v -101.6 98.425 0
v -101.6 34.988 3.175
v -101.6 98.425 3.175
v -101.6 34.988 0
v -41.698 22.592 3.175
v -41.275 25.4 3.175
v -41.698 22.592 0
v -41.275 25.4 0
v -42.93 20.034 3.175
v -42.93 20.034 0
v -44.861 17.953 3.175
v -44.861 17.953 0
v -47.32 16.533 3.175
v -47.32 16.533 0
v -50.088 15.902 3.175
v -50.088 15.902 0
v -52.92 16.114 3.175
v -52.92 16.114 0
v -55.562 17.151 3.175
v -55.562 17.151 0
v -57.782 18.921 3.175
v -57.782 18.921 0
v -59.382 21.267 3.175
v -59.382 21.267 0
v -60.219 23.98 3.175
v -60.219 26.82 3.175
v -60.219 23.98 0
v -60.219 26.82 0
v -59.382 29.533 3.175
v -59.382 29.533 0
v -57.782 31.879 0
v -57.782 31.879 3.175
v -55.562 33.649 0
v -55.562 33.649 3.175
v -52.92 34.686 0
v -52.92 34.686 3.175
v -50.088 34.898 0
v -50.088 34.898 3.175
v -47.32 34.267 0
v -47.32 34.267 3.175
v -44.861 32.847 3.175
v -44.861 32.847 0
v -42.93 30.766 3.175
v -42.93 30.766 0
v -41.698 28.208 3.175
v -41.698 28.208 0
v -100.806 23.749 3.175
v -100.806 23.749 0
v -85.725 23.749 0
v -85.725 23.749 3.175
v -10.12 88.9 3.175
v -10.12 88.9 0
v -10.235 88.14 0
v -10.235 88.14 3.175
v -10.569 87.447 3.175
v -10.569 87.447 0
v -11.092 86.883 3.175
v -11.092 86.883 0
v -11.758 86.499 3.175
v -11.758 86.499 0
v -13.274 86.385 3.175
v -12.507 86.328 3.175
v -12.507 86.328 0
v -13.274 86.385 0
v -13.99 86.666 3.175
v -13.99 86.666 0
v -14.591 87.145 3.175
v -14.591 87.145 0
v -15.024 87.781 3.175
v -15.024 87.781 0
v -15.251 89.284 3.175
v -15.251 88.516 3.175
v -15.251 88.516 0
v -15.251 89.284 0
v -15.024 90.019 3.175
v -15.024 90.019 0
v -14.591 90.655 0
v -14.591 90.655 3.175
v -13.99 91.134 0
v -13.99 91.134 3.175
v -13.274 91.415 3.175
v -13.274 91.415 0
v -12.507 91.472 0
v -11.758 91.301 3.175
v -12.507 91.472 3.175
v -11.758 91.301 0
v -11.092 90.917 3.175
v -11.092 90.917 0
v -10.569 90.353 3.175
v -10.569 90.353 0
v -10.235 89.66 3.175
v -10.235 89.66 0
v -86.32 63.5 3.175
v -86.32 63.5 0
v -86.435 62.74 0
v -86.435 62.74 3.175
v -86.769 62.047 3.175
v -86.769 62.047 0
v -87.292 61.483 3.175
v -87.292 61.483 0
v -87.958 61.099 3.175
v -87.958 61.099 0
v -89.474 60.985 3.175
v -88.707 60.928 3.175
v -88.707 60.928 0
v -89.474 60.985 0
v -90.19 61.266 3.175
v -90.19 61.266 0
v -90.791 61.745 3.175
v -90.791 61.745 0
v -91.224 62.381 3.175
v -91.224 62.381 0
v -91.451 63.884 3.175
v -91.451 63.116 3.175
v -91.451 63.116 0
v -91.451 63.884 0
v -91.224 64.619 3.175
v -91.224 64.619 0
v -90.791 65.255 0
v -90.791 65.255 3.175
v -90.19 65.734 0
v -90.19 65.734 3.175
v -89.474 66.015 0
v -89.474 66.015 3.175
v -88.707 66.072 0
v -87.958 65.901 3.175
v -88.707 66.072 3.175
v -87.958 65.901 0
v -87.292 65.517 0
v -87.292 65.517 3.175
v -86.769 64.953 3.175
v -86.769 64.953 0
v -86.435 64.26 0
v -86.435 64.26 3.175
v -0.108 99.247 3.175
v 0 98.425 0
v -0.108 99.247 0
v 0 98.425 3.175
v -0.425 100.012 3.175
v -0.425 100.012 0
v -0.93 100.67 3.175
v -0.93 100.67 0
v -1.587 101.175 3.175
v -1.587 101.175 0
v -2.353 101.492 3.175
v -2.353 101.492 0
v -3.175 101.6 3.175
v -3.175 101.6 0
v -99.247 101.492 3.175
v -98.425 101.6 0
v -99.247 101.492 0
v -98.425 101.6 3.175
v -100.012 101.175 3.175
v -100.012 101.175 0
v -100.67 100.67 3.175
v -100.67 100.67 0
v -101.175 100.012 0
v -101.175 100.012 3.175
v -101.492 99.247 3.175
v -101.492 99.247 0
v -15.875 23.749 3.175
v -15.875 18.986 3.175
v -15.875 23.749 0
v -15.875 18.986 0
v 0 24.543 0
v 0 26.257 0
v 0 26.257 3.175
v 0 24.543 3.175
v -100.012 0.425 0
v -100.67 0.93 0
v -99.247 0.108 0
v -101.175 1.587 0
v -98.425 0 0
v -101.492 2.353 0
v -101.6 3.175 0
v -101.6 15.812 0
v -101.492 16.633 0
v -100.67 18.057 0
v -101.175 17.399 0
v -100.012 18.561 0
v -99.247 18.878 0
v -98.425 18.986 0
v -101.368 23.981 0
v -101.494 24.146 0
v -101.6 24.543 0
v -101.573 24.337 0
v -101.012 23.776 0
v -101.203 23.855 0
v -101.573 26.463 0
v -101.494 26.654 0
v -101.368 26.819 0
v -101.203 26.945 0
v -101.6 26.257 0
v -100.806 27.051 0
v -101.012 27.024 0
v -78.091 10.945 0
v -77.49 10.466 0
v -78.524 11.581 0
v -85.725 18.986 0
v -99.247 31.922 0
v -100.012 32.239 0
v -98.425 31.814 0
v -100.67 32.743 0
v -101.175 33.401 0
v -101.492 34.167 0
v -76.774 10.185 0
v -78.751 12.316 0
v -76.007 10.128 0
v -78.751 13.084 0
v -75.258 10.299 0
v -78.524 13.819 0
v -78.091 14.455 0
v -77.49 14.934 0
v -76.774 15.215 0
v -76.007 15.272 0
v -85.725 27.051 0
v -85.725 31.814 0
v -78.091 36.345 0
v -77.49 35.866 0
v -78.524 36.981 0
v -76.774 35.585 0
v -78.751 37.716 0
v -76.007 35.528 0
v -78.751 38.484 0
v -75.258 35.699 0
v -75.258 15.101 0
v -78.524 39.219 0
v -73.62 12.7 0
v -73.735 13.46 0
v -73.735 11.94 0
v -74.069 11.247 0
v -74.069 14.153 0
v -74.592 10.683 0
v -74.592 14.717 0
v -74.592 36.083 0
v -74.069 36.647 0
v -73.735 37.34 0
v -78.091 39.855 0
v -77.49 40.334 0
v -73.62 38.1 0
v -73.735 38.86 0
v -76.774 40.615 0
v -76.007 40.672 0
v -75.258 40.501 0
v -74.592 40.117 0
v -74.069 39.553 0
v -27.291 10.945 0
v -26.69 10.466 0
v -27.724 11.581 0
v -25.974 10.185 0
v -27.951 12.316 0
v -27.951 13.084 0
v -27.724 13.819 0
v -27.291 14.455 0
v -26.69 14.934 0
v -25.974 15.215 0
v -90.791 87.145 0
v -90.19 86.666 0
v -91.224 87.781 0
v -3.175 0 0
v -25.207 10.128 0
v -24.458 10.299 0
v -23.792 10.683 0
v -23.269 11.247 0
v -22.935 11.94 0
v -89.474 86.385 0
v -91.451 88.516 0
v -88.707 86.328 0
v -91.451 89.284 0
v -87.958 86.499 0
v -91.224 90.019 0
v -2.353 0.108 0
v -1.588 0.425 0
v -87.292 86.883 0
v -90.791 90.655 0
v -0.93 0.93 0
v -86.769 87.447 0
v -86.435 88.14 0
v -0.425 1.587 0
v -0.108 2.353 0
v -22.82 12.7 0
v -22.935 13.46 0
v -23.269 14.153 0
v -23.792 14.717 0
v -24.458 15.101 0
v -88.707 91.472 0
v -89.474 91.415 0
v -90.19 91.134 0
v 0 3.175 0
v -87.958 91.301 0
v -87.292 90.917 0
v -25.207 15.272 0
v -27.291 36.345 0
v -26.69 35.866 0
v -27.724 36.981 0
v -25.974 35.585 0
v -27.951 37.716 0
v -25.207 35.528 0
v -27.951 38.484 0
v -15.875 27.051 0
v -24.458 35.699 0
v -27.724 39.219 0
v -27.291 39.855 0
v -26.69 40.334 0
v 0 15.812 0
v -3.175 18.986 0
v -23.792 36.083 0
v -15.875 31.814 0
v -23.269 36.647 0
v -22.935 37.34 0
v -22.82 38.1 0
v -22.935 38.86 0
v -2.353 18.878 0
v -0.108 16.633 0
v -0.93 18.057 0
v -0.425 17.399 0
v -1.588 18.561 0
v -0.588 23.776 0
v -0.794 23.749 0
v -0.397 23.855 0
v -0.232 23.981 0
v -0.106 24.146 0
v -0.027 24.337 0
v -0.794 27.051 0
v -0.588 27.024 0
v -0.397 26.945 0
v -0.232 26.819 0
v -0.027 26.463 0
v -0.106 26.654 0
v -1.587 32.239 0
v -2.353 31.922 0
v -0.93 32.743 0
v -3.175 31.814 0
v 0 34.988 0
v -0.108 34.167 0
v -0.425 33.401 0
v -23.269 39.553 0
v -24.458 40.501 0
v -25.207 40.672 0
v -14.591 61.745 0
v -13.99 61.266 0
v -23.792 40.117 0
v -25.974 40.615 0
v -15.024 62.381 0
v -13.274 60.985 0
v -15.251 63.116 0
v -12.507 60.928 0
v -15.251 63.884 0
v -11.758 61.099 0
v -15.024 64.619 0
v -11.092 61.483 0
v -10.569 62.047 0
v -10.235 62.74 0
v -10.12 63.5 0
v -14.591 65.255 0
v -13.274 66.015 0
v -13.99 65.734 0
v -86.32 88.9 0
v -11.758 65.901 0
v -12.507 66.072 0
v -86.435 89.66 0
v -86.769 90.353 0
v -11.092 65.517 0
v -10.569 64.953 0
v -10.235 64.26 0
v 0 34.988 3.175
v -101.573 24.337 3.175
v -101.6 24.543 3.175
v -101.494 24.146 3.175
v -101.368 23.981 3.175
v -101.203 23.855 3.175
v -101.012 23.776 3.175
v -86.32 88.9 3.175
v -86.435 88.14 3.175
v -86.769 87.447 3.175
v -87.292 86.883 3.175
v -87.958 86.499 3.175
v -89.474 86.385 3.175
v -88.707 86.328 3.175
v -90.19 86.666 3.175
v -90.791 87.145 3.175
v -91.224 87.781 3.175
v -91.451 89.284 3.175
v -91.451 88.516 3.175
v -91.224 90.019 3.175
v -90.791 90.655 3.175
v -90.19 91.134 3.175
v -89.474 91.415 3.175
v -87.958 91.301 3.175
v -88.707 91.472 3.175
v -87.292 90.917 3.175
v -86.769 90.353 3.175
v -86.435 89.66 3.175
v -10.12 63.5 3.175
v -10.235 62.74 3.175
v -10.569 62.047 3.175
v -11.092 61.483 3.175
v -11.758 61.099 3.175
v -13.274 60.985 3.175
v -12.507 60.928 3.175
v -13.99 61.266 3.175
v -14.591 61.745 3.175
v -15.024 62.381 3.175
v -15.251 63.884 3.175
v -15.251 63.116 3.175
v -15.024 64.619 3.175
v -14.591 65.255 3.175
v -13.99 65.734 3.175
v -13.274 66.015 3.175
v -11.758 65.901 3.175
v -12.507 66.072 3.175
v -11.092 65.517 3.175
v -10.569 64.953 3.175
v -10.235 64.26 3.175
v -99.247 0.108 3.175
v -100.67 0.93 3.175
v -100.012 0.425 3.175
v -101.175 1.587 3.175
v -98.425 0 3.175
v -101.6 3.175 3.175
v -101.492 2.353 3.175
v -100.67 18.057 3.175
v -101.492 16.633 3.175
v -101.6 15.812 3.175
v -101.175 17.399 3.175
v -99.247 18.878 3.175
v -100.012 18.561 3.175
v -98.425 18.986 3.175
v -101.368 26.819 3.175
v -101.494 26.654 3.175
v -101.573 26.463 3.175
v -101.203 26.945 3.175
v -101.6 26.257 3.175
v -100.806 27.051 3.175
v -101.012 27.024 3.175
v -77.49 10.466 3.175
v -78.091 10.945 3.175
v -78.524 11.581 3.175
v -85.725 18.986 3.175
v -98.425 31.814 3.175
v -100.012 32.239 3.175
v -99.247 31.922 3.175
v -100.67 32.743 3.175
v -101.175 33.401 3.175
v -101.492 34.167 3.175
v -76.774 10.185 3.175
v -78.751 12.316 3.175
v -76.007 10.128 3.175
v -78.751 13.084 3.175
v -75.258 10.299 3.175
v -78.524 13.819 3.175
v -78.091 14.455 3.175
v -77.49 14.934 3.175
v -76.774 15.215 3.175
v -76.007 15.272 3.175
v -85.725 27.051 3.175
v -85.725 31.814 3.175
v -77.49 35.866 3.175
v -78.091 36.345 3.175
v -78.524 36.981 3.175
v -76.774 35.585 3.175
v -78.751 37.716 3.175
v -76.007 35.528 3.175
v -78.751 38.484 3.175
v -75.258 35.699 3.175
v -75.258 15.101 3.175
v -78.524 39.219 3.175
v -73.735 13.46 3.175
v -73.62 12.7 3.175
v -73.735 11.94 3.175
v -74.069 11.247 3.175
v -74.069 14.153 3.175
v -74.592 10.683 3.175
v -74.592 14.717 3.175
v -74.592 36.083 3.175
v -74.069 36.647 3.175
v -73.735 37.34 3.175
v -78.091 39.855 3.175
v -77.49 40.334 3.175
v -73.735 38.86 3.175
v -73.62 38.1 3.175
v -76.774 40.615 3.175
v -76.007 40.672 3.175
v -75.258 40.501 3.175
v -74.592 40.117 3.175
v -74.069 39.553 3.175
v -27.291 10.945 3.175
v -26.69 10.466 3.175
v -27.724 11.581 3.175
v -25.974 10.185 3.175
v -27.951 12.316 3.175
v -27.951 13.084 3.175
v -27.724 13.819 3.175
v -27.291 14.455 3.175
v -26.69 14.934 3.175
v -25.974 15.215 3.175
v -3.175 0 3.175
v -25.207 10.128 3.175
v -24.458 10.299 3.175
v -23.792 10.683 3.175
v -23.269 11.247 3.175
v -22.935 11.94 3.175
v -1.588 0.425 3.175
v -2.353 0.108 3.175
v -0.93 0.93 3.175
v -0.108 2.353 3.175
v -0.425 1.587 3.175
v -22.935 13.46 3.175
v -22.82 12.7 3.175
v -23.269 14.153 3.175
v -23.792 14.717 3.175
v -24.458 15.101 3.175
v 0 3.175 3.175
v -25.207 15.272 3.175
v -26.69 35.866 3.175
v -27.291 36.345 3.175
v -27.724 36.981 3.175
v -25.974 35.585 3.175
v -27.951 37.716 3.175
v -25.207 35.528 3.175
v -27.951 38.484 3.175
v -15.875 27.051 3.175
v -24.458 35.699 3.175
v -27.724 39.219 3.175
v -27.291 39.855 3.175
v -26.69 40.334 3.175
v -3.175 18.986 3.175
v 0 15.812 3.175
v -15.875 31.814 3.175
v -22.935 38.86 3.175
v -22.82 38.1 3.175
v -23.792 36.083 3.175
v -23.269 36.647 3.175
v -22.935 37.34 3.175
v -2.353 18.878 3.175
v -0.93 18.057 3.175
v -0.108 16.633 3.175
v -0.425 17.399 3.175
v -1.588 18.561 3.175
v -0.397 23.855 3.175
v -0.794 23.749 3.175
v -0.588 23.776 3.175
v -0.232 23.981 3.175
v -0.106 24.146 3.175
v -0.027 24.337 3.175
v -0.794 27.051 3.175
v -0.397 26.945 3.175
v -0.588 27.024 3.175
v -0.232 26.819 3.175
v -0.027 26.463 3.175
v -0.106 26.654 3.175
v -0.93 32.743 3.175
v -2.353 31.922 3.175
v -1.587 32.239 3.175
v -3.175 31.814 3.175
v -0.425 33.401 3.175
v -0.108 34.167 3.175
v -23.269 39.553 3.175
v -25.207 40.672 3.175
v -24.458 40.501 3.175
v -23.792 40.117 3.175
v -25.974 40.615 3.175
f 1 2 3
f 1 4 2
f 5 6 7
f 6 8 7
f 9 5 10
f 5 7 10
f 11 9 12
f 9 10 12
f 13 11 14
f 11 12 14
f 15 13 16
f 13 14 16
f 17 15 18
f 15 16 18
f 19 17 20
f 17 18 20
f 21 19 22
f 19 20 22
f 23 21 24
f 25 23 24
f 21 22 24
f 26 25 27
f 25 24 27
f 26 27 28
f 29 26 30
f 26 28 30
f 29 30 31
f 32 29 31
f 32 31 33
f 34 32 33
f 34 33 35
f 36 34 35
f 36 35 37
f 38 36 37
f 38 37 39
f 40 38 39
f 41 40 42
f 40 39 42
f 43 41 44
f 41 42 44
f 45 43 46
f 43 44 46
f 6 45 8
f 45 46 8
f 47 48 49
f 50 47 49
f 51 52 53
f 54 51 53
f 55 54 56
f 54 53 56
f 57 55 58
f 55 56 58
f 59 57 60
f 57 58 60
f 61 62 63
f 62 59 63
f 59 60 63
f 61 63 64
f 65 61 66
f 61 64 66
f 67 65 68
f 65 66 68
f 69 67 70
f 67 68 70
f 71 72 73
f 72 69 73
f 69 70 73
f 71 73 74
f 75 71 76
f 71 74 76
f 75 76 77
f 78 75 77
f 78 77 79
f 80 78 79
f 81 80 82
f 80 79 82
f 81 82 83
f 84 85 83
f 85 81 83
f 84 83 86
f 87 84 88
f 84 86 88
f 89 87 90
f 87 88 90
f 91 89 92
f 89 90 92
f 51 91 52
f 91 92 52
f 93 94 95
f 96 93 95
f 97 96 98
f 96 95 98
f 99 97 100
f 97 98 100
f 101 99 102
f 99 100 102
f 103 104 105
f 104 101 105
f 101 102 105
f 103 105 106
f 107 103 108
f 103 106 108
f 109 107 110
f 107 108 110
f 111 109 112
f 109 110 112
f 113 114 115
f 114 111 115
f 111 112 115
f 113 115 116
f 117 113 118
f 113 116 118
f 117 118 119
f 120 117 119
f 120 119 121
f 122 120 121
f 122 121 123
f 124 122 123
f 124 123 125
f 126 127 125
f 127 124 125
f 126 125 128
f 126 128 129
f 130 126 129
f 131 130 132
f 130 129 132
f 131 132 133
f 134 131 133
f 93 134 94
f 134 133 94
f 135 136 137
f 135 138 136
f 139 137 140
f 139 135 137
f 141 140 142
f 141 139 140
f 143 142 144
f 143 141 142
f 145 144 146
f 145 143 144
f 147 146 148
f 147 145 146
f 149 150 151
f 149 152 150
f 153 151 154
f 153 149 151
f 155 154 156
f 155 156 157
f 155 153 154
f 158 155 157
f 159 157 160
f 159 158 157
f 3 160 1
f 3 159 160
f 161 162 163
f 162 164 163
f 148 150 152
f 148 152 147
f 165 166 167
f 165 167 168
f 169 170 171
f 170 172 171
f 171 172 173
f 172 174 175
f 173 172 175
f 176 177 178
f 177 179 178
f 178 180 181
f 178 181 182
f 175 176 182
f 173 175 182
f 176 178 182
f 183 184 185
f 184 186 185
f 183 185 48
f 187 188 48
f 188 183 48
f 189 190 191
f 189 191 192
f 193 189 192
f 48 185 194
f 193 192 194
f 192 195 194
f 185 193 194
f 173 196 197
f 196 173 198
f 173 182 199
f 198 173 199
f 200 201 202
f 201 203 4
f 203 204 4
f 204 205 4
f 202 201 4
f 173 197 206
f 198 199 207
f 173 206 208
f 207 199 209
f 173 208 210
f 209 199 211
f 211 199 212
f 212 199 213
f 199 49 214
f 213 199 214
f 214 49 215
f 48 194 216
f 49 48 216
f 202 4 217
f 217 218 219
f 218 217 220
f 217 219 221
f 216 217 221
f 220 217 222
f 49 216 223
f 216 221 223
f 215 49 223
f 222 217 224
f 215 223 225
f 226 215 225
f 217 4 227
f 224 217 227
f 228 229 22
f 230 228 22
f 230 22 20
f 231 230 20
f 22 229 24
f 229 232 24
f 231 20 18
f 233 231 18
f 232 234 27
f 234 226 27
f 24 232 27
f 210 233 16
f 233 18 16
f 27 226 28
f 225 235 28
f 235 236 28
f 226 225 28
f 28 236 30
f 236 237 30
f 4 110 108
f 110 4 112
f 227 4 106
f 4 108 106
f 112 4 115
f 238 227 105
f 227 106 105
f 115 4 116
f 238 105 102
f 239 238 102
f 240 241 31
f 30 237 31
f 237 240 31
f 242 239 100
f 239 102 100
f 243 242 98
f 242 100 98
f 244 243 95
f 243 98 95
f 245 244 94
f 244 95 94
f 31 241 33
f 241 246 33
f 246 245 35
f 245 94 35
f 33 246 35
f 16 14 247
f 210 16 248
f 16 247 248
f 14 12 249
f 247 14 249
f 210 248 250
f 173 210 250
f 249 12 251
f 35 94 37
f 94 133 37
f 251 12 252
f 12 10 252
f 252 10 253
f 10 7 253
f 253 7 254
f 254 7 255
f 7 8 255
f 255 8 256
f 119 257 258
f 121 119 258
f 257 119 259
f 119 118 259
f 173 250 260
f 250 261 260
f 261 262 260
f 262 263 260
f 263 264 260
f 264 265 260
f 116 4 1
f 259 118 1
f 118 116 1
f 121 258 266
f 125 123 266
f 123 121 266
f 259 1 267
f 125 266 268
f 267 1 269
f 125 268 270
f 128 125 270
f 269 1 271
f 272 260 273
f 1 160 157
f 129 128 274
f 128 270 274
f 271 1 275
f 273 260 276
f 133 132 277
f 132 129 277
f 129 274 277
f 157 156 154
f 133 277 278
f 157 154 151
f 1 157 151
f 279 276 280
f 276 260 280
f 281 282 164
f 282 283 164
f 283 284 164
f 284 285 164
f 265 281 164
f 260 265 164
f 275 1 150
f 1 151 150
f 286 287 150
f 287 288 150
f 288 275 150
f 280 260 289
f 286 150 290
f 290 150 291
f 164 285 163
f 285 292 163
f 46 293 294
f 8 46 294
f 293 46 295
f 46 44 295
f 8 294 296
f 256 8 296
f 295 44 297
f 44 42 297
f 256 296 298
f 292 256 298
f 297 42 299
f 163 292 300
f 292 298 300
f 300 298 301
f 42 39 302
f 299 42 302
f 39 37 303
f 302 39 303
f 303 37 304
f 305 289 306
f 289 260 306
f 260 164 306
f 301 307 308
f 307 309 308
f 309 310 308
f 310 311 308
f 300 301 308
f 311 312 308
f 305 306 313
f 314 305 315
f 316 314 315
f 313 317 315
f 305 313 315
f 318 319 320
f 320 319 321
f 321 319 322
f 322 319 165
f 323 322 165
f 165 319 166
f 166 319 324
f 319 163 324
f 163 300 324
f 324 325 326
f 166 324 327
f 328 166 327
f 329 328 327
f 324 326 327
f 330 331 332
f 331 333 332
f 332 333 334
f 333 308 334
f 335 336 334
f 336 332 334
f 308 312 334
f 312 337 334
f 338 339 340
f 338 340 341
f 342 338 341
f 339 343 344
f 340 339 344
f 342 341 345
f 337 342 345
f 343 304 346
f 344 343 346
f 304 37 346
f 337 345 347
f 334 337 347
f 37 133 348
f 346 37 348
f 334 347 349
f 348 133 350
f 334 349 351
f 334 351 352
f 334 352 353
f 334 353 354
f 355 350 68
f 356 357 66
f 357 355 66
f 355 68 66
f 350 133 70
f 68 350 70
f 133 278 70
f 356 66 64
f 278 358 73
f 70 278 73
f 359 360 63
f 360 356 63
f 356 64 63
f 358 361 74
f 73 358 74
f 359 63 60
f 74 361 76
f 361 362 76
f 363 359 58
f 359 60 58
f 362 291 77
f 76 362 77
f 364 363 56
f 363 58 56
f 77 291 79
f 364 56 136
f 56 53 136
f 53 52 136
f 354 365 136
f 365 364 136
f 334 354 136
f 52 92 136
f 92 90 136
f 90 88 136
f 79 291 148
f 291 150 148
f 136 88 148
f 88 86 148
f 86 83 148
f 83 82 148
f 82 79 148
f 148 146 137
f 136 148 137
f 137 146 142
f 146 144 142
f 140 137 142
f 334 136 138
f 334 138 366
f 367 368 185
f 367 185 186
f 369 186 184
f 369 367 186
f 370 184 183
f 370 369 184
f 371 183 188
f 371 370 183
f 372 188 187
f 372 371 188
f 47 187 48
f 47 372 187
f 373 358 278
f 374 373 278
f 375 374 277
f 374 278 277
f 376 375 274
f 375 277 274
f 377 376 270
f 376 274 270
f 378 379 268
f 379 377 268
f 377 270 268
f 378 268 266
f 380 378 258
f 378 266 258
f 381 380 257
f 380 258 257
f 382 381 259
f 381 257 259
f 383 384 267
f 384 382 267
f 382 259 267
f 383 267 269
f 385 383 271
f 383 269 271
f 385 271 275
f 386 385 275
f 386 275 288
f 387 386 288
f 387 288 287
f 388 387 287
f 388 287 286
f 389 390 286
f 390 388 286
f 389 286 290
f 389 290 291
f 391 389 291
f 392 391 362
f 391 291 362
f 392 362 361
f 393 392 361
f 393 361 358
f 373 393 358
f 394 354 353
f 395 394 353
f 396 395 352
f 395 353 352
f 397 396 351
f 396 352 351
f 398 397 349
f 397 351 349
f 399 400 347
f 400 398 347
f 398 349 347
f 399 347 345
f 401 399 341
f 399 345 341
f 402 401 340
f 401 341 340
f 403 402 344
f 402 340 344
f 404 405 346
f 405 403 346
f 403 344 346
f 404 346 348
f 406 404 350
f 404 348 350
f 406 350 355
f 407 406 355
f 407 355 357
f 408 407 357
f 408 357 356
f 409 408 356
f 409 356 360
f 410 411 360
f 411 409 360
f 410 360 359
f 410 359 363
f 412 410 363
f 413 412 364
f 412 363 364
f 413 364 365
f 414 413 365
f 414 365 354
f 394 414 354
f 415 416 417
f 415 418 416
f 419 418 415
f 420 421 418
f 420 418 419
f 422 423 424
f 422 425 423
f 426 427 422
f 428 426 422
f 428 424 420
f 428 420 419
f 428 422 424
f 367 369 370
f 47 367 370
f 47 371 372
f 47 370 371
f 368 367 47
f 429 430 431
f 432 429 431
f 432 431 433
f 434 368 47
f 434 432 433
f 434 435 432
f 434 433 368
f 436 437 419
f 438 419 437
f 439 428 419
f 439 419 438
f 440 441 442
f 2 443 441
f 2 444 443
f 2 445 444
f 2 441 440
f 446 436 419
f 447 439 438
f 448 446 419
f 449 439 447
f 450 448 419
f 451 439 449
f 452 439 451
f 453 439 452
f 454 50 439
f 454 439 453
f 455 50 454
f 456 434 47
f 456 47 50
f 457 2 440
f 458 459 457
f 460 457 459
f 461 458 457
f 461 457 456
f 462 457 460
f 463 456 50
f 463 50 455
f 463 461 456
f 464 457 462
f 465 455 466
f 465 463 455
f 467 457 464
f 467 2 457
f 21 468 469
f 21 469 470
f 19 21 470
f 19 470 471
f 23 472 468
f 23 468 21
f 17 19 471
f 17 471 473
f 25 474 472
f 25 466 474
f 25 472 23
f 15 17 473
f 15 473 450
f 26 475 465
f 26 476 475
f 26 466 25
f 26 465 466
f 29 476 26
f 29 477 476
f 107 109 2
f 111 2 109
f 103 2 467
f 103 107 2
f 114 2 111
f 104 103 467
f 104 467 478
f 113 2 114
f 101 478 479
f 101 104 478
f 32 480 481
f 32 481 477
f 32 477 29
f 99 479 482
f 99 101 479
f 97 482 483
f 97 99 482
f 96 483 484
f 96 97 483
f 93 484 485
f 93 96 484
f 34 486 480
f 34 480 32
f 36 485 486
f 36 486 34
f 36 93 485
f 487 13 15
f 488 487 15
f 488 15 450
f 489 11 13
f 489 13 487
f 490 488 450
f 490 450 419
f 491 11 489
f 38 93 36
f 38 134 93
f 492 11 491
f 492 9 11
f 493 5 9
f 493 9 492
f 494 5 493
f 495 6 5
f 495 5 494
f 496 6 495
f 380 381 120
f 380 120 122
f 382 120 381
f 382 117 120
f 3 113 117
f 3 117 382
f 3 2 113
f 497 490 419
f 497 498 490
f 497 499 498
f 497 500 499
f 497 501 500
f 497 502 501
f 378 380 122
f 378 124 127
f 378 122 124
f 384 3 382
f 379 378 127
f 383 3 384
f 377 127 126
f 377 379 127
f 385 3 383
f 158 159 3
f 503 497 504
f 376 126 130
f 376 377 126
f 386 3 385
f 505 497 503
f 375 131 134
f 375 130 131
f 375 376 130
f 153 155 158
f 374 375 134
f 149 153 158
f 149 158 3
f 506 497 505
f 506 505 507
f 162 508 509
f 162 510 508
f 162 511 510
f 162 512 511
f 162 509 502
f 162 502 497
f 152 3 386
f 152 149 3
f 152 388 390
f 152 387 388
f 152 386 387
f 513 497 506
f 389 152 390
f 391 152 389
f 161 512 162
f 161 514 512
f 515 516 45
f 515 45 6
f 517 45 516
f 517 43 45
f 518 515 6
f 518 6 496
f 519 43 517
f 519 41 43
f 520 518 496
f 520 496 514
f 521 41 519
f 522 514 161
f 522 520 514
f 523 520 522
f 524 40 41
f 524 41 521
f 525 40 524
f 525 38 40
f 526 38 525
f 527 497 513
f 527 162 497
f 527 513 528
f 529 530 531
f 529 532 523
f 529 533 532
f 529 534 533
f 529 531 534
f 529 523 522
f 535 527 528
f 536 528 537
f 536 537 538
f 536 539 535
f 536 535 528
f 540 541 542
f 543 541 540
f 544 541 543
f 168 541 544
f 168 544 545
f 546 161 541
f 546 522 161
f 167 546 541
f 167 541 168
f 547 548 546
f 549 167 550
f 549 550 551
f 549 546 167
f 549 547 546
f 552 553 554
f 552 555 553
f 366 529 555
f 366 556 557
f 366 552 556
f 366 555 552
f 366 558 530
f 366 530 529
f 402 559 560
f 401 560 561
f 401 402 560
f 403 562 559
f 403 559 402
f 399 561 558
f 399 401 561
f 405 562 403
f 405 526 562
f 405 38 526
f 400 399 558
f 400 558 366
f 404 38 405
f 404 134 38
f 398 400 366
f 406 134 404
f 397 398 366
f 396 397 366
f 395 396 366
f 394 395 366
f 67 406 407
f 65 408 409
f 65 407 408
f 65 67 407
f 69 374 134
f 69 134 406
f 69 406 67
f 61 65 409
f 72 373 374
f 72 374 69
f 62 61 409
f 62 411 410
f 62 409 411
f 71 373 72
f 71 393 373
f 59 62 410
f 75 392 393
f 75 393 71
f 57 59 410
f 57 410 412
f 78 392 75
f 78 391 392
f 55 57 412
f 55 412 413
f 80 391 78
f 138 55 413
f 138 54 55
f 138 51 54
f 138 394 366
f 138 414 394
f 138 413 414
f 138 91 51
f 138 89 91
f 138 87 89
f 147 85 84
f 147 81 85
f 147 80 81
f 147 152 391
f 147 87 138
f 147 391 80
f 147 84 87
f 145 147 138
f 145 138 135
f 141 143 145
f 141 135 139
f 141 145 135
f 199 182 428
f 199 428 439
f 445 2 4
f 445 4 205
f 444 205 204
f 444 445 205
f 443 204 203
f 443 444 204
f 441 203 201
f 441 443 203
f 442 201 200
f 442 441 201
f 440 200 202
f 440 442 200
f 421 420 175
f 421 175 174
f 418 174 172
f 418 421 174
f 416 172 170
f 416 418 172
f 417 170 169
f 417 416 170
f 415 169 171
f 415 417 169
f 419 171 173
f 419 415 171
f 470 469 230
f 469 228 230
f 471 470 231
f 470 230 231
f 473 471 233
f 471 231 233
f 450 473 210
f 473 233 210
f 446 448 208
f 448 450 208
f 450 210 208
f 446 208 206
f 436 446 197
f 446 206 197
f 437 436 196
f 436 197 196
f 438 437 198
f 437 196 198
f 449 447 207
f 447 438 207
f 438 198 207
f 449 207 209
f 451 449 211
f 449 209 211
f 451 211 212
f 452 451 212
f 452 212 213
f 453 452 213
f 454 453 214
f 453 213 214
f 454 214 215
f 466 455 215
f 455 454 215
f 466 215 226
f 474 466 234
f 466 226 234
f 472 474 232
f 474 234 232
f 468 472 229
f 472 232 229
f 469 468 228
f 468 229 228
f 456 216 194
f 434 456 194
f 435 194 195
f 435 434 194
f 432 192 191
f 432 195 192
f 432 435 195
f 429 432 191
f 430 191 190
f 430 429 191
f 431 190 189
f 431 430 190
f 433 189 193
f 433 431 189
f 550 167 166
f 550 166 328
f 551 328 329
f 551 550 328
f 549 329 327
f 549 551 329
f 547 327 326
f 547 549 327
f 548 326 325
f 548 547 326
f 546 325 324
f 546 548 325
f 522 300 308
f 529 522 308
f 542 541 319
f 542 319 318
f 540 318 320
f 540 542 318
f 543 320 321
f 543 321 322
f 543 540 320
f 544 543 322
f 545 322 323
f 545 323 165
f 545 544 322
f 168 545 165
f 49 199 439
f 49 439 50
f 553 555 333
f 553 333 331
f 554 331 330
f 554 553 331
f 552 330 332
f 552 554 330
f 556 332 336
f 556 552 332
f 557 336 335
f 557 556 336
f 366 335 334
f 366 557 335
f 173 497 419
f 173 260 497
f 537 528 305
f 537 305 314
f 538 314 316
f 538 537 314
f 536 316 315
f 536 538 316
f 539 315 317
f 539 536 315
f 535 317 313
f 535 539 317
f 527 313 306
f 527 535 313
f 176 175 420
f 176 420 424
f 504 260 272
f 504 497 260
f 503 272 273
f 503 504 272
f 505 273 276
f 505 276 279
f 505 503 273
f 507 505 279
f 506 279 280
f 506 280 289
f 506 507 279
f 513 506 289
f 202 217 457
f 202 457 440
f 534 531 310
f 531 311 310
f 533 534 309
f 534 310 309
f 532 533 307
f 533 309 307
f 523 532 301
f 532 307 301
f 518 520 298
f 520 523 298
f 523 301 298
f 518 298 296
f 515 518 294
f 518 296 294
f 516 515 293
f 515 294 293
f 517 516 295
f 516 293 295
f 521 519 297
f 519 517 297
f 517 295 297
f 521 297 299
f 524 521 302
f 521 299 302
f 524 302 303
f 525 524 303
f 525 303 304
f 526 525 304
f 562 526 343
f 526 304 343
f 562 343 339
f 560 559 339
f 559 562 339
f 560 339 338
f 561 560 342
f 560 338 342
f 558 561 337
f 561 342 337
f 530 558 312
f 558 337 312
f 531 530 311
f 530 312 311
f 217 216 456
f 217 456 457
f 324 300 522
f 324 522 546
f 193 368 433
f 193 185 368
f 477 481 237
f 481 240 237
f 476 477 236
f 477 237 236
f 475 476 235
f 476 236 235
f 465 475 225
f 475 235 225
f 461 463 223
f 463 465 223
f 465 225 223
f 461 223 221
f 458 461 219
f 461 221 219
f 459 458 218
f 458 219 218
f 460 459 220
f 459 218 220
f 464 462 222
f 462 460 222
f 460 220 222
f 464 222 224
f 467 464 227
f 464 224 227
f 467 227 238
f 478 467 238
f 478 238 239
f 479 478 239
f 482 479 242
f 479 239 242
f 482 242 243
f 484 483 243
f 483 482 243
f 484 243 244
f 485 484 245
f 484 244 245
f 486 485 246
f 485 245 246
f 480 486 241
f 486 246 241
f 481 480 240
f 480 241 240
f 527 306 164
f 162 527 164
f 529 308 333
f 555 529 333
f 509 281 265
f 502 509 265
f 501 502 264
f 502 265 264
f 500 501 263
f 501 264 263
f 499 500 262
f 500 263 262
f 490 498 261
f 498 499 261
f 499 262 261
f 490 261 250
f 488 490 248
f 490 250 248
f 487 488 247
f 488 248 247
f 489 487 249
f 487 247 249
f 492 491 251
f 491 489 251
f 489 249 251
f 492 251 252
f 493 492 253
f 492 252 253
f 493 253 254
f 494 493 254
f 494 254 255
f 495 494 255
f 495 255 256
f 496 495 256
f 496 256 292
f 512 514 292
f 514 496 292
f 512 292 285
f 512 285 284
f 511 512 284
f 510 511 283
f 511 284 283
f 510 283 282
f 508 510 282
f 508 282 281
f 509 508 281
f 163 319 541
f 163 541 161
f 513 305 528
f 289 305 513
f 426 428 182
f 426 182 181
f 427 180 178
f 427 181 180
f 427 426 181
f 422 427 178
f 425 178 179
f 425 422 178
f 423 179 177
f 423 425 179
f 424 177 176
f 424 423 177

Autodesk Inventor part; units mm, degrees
ref_plane "YZ Plane" through (0, 0, 0) normal (1, 0, 0) x (0, 1, 0)
ref_plane "XZ Plane" through (0, 0, 0) normal (0, 1, 0) x (-1, 0, 0)
ref_plane "XY Plane" through (0, 0, 0) normal (0, 0, 1) x (1, 0, 0)
sketch "Sketch2" plane through (0, 0, 0) normal (0, 0, 1) x (1, 0, 0)
  line L0 (0, 0) -> (-101.6, 0)
  line L1 (-101.6, 0) -> (-101.6, 101.6)
  line L2 (-101.6, 101.6) -> (0, 101.6)
  line L3 (0, 101.6) -> (0, 0)
  circle A0 centre (-12.7, 88.9) radius 2.5797
  circle A1 centre (-50.8, 76.2) radius 9.525
  circle A2 centre (-25.4, 38.1) radius 2.5797
  circle A3 centre (-50.8, 25.4) radius 9.525
  circle A4 centre (-88.9, 88.9) radius 2.5797
  circle A5 centre (-12.7, 63.5) radius 2.5797
  circle A6 centre (-88.9, 63.5) radius 2.5797
  circle A7 centre (-76.2, 38.1) radius 2.5797
  circle A8 centre (-25.4, 12.7) radius 2.5797
  circle A9 centre (-76.2, 12.7) radius 2.5797
  line L4 (-85.725, 19.05) -> (-101.6, 19.05)
  line L5 (-101.6, 19.05) -> (-101.6, 22.225)
  line L6 (-101.6, 22.225) -> (-85.725, 22.225)
  line L7 (-85.725, 22.225) -> (-85.725, 19.05)
  line L8 (-101.6, 22.225) -> (-85.725, 22.225)
  line L9 (-85.725, 22.225) -> (-85.725, 23.8125)
  line L10 (-85.725, 23.8125) -> (-101.6, 23.8125)
  line L11 (-101.6, 23.8125) -> (-101.6, 22.225)
  line L12 (-85.725, 23.8125) -> (-101.6, 23.8125)
  line L13 (-101.6, 23.8125) -> (-101.6, 26.9875)
  line L14 (-101.6, 26.9875) -> (-85.725, 26.9875)
  line L15 (-85.725, 26.9875) -> (-85.725, 23.8125)
  line L16 (-101.6, 26.9875) -> (-85.725, 26.9875)
  line L17 (-85.725, 26.9875) -> (-85.725, 28.575)
  line L18 (-85.725, 28.575) -> (-101.6, 28.575)
  line L19 (-101.6, 28.575) -> (-101.6, 26.9875)
  line L20 (-85.725, 28.575) -> (-101.6, 28.575)
  line L21 (-101.6, 28.575) -> (-101.6, 31.75)
  line L22 (-101.6, 31.75) -> (-85.725, 31.75)
  line L23 (-85.725, 31.75) -> (-85.725, 28.575)
  line L24 (-85.725, 31.8135) -> (-101.6, 31.8135)
  line L25 (-101.6, 31.8135) -> (-101.6, 28.5115)
  line L26 (-101.6, 28.5115) -> (-85.725, 28.5115)
  line L27 (-85.725, 28.5115) -> (-85.725, 31.8135)
  line L28 (-85.725, 27.051) -> (-101.6, 27.051)
  line L29 (-101.6, 27.051) -> (-101.6, 23.749)
  line L30 (-101.6, 23.749) -> (-85.725, 23.749)
  line L31 (-85.725, 23.749) -> (-85.725, 27.051)
  line L32 (-85.725, 22.2885) -> (-101.6, 22.2885)
  line L33 (-101.6, 22.2885) -> (-101.6, 18.9865)
  line L34 (-101.6, 18.9865) -> (-85.725, 18.9865)
  line L35 (-85.725, 18.9865) -> (-85.725, 22.2885)
  line L36 (-101.6, 26.4583) -> (-85.725, 26.4583)
  line L37 (-85.725, 26.4583) -> (-85.725, 24.3417)
  line L38 (-85.725, 24.3417) -> (-101.6, 24.3417)
  line L39 (-101.6, 24.3417) -> (-101.6, 26.4583)
  line L40 (-50.8, 0) -> (-50.8, 101.6)
  line L41 (-15.875, 19.05) -> (0, 19.05)
  line L42 (0, 19.05) -> (0, 22.225)
  line L43 (0, 22.225) -> (-15.875, 22.225)
  line L44 (-15.875, 22.225) -> (-15.875, 19.05)
  line L45 (0, 22.225) -> (-15.875, 22.225)
  line L46 (-15.875, 22.225) -> (-15.875, 23.8125)
  line L47 (-15.875, 23.8125) -> (0, 23.8125)
  line L48 (0, 23.8125) -> (0, 22.225)
  line L49 (-15.875, 23.8125) -> (0, 23.8125)
  line L50 (0, 23.8125) -> (0, 26.9875)
  line L51 (0, 26.9875) -> (-15.875, 26.9875)
  line L52 (-15.875, 26.9875) -> (-15.875, 23.8125)
  line L53 (0, 26.9875) -> (-15.875, 26.9875)
  line L54 (-15.875, 26.9875) -> (-15.875, 28.575)
  line L55 (-15.875, 28.575) -> (0, 28.575)
  line L56 (0, 28.575) -> (0, 26.9875)
  line L57 (-15.875, 28.575) -> (0, 28.575)
  line L58 (0, 28.575) -> (0, 31.75)
  line L59 (0, 31.75) -> (-15.875, 31.75)
  line L60 (-15.875, 31.75) -> (-15.875, 28.575)
  line L61 (-15.875, 31.8135) -> (0, 31.8135)
  line L62 (0, 31.8135) -> (0, 28.5115)
  line L63 (0, 28.5115) -> (-15.875, 28.5115)
  line L64 (-15.875, 28.5115) -> (-15.875, 31.8135)
  line L65 (-15.875, 27.051) -> (0, 27.051)
  line L66 (0, 27.051) -> (0, 23.749)
  line L67 (0, 23.749) -> (-15.875, 23.749)
  line L68 (-15.875, 23.749) -> (-15.875, 27.051)
  line L69 (-15.875, 22.2885) -> (0, 22.2885)
  line L70 (0, 22.2885) -> (0, 18.9865)
  line L71 (0, 18.9865) -> (-15.875, 18.9865)
  line L72 (-15.875, 18.9865) -> (-15.875, 22.2885)
  line L73 (0, 26.4583) -> (-15.875, 26.4583)
  line L74 (-15.875, 26.4583) -> (-15.875, 24.3417)
  line L75 (-15.875, 24.3417) -> (0, 24.3417)
  line L76 (0, 24.3417) -> (0, 26.4583)
  point P0 (-101.6, 30.1625)
  point P1 (-101.6, 20.6375)
  point P2 (-101.6, 25.4)
  point P3 (-85.725, 25.4)
  point P4 (0, 30.1625)
  point P5 (0, 20.6375)
  point P6 (0, 25.4)
  point P7 (-15.875, 25.4)
  point P8 (-50.8, 15.875)
  point P9 (-50.8, 34.925)
  point P10 (-50.8, 66.675)
  point P11 (-50.8, 85.725)
  dimension "d60" = 101.6
  dimension "d61" = 101.6
  dimension "d62" = 19.05
  dimension "d63" = 5.1594
  dimension "d66" = 12.7
  dimension "d69" = 76.2
  dimension "d72" = 25.4
  dimension "d75" = 12.7
  dimension "d76" = 38.1
  dimension "d77" = 12.7
  dimension "d80" = 50.8
  dimension "d83" = 25.4
  dimension "d86" = 25.4
  dimension "d87" = 12.7
  dimension "d88" = 12.7
  dimension "d89" = 25.4
  dimension "d96" = 3.175
  dimension "d97" = 1.5875
  dimension "d98" = 3.302
  dimension "d101" = 2.1167
  dimension "d103" = 15.875
  dimension "d104" = 25.4
extrude "Extrusion2" add sketch "Sketch2" along normal blind 3.175 contours L0 L40 A3 A1 L2 L3 L61 L64 L60 L54 L52 L46 L44 L72 L71 | L0 L1 L34 L35 L7 L9 L15 L17 L23 L27 L24 L2 L40 A1 A3 | L40 A1 | A1 L40 | L67 L46 L47 L3 | L47 L52 L75 L3 | L1 L10 L9 L30 | L75 L52 L73 L3 | L1 L38 L15 L10 | L73 L52 L51 L3 | L1 L36 L15 L38 | L51 L54 L65 L3 | L1 L14 L15 L36 | L1 L28 L17 L14
fillet "Fillet3" radius 3.175 8 edges at (0, 101.6, 1.5875) (-101.6, 101.6, 1.5875) (0, 18.9865, 1.5875) (0, 31.8135, 1.5875) (0, 0, 1.5875) (-101.6, 0, 1.5875) (-101.6, 18.9865, 1.5875) (-101.6, 31.8135, 1.5875)
fillet "Fillet5" radius 0.7937 4 edges at (0, 27.051, 1.5875) (0, 23.749, 1.5875) (-101.6, 27.051, 1.5875) (-101.6, 23.749, 1.5875)
properties part number "Dipper Plate (backplate)"
